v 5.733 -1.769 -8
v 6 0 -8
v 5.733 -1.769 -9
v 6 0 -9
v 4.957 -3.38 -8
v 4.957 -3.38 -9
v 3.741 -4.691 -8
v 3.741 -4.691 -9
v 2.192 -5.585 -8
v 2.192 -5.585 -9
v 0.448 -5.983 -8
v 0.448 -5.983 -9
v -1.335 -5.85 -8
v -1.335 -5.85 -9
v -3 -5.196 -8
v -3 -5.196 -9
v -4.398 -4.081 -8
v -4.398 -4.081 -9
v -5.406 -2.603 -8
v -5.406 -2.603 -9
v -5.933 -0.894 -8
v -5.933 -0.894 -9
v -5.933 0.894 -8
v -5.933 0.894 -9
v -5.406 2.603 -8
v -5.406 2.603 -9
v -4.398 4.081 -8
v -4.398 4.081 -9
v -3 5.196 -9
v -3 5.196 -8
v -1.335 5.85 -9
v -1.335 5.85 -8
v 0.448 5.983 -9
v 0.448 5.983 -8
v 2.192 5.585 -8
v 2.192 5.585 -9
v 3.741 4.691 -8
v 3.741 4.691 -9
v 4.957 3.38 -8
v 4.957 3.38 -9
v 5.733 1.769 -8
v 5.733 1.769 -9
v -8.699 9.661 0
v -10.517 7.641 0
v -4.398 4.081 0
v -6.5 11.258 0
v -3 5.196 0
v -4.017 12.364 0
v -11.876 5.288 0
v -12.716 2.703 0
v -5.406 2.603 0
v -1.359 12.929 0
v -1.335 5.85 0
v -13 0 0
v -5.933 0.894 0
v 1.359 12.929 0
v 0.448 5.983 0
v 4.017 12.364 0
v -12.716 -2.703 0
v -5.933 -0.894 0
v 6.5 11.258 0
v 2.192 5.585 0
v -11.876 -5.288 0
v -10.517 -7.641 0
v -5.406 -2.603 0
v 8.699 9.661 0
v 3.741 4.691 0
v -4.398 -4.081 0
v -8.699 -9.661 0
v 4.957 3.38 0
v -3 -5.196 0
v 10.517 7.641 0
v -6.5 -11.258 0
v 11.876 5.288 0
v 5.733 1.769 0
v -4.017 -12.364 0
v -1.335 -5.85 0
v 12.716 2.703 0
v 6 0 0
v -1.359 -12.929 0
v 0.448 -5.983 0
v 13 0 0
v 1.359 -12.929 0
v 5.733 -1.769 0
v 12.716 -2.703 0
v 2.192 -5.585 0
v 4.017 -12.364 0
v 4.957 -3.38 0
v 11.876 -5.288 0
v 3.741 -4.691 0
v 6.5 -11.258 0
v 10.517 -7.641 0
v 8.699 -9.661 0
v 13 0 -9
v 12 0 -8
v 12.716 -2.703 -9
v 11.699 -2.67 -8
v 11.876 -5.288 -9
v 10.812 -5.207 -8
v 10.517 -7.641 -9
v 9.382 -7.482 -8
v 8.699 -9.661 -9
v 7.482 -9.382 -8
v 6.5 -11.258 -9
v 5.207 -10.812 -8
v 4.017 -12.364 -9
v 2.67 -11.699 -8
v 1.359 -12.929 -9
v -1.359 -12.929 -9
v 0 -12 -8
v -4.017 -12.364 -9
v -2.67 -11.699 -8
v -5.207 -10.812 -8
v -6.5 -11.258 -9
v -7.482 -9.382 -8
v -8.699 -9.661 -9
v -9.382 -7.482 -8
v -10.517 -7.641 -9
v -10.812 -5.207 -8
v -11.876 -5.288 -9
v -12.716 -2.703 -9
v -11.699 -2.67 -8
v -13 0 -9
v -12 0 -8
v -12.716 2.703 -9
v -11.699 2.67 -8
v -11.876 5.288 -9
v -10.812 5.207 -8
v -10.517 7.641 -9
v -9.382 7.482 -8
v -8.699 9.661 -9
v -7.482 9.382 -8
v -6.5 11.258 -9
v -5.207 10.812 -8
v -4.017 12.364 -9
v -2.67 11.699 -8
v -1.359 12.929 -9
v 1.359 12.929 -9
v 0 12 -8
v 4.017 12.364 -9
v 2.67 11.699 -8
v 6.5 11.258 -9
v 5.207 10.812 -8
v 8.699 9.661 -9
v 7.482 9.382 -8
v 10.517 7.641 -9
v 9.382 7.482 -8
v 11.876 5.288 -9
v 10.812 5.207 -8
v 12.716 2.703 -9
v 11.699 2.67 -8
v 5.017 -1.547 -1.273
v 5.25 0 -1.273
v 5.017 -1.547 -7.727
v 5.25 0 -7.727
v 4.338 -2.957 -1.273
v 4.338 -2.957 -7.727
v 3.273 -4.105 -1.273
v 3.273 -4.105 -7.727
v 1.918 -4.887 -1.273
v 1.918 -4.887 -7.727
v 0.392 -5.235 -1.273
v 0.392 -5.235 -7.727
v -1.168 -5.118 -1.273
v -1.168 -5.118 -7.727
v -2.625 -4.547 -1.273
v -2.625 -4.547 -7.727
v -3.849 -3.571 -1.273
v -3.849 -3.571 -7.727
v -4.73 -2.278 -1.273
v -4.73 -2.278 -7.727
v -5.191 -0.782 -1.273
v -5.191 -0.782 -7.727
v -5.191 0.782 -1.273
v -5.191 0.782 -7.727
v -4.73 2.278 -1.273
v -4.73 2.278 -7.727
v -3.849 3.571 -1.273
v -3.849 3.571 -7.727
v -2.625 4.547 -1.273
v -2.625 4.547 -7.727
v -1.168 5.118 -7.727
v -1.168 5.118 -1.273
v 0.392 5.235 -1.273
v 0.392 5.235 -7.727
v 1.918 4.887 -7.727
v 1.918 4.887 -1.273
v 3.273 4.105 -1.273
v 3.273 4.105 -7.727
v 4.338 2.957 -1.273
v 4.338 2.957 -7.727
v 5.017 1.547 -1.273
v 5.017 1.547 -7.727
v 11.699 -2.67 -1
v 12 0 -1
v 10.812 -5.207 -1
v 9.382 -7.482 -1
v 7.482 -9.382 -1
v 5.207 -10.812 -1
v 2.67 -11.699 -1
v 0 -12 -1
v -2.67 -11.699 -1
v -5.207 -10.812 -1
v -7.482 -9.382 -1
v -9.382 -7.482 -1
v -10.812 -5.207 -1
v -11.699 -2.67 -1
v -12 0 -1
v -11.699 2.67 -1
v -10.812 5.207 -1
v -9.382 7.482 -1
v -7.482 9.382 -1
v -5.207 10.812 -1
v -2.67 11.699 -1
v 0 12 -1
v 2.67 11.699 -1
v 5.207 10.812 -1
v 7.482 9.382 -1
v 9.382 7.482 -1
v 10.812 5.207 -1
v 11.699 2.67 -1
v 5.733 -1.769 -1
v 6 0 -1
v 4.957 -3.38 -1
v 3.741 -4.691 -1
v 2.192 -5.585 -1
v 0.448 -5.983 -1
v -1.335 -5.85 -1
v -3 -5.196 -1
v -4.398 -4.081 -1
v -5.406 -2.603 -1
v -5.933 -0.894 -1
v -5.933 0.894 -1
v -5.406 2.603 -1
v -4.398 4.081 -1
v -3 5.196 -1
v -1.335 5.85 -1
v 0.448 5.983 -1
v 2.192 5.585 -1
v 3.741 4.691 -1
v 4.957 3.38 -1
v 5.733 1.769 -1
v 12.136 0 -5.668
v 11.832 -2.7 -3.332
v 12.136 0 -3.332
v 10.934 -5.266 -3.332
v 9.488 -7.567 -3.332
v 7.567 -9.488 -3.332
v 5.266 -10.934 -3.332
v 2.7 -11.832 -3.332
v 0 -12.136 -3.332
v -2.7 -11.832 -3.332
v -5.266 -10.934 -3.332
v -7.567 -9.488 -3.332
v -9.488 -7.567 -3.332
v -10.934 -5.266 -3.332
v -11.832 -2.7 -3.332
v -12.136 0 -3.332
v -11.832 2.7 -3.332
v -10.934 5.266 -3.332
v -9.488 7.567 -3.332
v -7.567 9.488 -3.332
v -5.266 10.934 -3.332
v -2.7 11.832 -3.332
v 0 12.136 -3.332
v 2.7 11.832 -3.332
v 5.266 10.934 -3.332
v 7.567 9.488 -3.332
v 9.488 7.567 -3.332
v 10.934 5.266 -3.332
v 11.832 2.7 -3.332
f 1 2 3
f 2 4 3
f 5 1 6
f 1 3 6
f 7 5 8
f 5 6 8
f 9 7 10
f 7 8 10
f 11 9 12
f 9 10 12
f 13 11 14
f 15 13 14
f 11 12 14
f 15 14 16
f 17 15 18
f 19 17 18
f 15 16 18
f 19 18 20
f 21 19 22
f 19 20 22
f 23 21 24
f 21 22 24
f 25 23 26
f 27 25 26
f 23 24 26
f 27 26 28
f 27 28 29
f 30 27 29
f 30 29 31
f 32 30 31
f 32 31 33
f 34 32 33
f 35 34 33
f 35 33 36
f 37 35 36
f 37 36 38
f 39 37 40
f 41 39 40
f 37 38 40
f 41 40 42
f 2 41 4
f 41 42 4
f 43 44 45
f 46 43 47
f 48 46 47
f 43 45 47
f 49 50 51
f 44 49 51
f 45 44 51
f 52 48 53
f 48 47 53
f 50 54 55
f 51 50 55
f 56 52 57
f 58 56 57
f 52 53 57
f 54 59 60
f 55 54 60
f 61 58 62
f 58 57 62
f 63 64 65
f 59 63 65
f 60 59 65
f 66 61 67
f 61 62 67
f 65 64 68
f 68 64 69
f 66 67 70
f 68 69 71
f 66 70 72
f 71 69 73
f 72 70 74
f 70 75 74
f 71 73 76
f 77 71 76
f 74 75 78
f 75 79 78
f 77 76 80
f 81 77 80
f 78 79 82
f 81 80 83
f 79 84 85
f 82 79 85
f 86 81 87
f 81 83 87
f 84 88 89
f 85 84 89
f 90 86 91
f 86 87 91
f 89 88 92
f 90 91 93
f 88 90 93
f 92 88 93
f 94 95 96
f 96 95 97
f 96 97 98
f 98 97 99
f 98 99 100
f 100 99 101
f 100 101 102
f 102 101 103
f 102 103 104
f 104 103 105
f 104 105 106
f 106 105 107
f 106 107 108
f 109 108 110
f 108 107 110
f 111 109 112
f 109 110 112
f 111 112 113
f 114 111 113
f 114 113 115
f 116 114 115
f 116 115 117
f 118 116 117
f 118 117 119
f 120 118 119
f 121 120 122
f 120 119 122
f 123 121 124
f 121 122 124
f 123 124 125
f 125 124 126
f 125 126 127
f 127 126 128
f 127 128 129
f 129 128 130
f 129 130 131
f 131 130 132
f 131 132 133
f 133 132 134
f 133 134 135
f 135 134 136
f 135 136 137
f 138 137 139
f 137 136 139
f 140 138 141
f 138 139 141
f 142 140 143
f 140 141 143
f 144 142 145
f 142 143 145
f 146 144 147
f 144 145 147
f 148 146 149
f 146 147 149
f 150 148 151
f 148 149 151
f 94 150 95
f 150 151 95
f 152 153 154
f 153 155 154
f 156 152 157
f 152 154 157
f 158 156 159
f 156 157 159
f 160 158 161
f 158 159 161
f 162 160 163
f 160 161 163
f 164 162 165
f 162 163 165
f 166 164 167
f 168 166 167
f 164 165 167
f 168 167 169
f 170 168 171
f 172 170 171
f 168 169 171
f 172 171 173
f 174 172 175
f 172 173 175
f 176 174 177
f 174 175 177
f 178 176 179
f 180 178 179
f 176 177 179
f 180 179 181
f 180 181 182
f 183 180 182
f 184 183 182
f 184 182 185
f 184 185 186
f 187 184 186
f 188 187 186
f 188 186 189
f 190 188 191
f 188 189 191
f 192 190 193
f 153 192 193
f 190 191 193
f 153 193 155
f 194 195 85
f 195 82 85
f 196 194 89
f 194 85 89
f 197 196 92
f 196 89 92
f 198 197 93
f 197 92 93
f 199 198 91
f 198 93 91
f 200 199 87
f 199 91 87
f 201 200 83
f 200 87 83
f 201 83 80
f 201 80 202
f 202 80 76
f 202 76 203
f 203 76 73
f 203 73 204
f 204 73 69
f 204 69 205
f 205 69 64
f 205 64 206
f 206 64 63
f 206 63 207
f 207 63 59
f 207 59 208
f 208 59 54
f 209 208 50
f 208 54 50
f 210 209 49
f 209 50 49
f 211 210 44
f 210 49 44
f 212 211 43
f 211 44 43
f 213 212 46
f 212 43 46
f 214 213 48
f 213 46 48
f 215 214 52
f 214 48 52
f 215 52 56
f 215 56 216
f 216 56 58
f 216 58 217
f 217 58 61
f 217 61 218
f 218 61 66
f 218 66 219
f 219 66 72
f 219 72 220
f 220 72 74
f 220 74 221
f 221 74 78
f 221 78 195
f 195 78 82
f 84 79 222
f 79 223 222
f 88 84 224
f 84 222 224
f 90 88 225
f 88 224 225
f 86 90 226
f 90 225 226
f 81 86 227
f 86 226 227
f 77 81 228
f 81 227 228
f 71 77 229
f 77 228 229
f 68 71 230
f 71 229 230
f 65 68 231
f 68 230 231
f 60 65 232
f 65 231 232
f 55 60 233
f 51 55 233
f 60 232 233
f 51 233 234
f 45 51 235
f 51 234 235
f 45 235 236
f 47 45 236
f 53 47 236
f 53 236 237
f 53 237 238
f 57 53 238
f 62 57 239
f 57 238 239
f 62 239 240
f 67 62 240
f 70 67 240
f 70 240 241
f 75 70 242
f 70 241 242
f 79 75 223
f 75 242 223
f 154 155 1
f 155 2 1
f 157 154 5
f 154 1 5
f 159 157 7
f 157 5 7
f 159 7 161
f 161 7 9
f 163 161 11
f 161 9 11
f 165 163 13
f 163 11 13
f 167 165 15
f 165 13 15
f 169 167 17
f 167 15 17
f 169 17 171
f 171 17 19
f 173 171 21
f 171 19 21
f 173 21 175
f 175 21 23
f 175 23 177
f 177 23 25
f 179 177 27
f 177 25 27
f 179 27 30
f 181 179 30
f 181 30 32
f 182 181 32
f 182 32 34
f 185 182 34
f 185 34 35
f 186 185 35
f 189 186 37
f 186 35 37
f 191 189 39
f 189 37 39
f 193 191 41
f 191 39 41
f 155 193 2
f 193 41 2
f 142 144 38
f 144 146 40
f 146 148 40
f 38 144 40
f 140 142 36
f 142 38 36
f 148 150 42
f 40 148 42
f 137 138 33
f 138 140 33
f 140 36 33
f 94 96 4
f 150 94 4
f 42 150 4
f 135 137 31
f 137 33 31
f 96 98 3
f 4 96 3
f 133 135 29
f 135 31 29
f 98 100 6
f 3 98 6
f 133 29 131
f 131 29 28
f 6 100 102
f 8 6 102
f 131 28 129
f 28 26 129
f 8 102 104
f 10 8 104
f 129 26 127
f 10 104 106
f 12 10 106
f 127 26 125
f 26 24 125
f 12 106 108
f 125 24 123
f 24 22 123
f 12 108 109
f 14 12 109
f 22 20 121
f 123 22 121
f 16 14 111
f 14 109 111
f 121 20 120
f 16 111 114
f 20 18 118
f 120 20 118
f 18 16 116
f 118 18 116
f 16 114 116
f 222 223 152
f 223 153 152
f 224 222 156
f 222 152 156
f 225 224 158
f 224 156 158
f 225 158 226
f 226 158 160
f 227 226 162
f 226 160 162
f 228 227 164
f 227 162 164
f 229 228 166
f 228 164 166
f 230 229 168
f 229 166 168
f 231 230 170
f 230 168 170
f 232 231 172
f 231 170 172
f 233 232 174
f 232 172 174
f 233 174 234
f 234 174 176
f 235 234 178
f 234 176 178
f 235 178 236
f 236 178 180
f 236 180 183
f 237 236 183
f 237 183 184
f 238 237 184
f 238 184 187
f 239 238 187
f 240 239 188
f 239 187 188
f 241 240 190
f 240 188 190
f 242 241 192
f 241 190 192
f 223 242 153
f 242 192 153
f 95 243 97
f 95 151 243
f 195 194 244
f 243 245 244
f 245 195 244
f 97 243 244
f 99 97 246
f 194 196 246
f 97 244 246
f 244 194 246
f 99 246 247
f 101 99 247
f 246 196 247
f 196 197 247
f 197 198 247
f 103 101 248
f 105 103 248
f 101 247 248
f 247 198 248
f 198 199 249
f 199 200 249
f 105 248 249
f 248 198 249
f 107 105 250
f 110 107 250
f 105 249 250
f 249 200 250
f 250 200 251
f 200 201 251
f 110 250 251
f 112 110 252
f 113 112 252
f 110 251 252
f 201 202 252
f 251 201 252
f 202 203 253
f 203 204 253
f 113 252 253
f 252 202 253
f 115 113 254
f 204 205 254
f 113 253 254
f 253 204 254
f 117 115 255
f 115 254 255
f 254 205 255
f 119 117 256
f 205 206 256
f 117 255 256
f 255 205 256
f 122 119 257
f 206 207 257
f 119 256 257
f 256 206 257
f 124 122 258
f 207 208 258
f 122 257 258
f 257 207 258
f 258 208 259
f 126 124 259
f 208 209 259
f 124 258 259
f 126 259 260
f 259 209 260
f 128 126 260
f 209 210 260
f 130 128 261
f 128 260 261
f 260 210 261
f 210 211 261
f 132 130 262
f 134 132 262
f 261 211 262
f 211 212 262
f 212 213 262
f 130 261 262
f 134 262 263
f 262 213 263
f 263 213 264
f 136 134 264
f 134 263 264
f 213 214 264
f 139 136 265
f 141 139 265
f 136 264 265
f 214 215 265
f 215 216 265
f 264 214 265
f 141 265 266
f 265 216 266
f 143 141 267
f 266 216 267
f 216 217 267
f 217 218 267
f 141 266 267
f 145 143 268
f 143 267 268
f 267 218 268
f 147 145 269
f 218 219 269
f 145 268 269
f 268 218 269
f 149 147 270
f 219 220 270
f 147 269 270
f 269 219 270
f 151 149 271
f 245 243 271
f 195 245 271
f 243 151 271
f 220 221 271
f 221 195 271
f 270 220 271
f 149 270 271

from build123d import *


# Not quite as in the source:
# - a feature names something its author has since deleted; it is built from what else it names


with BuildPart() as f1:
    # F0 (on Front) → F1 (revolve)
    with BuildSketch(Plane.XZ):
        Polygon((6, -9), (13, -9), (12, -8), (12, -1), (13, 0), (6, 0), (6, -1), (5.25, -1.2729776757), (5.25, -7.7270223243), (6, -8), align=None)
        with BuildLine():
            Line((12, -1), (12, -8))
            ThreePointArc((12, -8), (12.1528330258, -4.5), (12, -1))
        make_face()
    revolve(axis=Axis((0, 0, -4.5), (0, 0, -1)))


solid = f1.part
